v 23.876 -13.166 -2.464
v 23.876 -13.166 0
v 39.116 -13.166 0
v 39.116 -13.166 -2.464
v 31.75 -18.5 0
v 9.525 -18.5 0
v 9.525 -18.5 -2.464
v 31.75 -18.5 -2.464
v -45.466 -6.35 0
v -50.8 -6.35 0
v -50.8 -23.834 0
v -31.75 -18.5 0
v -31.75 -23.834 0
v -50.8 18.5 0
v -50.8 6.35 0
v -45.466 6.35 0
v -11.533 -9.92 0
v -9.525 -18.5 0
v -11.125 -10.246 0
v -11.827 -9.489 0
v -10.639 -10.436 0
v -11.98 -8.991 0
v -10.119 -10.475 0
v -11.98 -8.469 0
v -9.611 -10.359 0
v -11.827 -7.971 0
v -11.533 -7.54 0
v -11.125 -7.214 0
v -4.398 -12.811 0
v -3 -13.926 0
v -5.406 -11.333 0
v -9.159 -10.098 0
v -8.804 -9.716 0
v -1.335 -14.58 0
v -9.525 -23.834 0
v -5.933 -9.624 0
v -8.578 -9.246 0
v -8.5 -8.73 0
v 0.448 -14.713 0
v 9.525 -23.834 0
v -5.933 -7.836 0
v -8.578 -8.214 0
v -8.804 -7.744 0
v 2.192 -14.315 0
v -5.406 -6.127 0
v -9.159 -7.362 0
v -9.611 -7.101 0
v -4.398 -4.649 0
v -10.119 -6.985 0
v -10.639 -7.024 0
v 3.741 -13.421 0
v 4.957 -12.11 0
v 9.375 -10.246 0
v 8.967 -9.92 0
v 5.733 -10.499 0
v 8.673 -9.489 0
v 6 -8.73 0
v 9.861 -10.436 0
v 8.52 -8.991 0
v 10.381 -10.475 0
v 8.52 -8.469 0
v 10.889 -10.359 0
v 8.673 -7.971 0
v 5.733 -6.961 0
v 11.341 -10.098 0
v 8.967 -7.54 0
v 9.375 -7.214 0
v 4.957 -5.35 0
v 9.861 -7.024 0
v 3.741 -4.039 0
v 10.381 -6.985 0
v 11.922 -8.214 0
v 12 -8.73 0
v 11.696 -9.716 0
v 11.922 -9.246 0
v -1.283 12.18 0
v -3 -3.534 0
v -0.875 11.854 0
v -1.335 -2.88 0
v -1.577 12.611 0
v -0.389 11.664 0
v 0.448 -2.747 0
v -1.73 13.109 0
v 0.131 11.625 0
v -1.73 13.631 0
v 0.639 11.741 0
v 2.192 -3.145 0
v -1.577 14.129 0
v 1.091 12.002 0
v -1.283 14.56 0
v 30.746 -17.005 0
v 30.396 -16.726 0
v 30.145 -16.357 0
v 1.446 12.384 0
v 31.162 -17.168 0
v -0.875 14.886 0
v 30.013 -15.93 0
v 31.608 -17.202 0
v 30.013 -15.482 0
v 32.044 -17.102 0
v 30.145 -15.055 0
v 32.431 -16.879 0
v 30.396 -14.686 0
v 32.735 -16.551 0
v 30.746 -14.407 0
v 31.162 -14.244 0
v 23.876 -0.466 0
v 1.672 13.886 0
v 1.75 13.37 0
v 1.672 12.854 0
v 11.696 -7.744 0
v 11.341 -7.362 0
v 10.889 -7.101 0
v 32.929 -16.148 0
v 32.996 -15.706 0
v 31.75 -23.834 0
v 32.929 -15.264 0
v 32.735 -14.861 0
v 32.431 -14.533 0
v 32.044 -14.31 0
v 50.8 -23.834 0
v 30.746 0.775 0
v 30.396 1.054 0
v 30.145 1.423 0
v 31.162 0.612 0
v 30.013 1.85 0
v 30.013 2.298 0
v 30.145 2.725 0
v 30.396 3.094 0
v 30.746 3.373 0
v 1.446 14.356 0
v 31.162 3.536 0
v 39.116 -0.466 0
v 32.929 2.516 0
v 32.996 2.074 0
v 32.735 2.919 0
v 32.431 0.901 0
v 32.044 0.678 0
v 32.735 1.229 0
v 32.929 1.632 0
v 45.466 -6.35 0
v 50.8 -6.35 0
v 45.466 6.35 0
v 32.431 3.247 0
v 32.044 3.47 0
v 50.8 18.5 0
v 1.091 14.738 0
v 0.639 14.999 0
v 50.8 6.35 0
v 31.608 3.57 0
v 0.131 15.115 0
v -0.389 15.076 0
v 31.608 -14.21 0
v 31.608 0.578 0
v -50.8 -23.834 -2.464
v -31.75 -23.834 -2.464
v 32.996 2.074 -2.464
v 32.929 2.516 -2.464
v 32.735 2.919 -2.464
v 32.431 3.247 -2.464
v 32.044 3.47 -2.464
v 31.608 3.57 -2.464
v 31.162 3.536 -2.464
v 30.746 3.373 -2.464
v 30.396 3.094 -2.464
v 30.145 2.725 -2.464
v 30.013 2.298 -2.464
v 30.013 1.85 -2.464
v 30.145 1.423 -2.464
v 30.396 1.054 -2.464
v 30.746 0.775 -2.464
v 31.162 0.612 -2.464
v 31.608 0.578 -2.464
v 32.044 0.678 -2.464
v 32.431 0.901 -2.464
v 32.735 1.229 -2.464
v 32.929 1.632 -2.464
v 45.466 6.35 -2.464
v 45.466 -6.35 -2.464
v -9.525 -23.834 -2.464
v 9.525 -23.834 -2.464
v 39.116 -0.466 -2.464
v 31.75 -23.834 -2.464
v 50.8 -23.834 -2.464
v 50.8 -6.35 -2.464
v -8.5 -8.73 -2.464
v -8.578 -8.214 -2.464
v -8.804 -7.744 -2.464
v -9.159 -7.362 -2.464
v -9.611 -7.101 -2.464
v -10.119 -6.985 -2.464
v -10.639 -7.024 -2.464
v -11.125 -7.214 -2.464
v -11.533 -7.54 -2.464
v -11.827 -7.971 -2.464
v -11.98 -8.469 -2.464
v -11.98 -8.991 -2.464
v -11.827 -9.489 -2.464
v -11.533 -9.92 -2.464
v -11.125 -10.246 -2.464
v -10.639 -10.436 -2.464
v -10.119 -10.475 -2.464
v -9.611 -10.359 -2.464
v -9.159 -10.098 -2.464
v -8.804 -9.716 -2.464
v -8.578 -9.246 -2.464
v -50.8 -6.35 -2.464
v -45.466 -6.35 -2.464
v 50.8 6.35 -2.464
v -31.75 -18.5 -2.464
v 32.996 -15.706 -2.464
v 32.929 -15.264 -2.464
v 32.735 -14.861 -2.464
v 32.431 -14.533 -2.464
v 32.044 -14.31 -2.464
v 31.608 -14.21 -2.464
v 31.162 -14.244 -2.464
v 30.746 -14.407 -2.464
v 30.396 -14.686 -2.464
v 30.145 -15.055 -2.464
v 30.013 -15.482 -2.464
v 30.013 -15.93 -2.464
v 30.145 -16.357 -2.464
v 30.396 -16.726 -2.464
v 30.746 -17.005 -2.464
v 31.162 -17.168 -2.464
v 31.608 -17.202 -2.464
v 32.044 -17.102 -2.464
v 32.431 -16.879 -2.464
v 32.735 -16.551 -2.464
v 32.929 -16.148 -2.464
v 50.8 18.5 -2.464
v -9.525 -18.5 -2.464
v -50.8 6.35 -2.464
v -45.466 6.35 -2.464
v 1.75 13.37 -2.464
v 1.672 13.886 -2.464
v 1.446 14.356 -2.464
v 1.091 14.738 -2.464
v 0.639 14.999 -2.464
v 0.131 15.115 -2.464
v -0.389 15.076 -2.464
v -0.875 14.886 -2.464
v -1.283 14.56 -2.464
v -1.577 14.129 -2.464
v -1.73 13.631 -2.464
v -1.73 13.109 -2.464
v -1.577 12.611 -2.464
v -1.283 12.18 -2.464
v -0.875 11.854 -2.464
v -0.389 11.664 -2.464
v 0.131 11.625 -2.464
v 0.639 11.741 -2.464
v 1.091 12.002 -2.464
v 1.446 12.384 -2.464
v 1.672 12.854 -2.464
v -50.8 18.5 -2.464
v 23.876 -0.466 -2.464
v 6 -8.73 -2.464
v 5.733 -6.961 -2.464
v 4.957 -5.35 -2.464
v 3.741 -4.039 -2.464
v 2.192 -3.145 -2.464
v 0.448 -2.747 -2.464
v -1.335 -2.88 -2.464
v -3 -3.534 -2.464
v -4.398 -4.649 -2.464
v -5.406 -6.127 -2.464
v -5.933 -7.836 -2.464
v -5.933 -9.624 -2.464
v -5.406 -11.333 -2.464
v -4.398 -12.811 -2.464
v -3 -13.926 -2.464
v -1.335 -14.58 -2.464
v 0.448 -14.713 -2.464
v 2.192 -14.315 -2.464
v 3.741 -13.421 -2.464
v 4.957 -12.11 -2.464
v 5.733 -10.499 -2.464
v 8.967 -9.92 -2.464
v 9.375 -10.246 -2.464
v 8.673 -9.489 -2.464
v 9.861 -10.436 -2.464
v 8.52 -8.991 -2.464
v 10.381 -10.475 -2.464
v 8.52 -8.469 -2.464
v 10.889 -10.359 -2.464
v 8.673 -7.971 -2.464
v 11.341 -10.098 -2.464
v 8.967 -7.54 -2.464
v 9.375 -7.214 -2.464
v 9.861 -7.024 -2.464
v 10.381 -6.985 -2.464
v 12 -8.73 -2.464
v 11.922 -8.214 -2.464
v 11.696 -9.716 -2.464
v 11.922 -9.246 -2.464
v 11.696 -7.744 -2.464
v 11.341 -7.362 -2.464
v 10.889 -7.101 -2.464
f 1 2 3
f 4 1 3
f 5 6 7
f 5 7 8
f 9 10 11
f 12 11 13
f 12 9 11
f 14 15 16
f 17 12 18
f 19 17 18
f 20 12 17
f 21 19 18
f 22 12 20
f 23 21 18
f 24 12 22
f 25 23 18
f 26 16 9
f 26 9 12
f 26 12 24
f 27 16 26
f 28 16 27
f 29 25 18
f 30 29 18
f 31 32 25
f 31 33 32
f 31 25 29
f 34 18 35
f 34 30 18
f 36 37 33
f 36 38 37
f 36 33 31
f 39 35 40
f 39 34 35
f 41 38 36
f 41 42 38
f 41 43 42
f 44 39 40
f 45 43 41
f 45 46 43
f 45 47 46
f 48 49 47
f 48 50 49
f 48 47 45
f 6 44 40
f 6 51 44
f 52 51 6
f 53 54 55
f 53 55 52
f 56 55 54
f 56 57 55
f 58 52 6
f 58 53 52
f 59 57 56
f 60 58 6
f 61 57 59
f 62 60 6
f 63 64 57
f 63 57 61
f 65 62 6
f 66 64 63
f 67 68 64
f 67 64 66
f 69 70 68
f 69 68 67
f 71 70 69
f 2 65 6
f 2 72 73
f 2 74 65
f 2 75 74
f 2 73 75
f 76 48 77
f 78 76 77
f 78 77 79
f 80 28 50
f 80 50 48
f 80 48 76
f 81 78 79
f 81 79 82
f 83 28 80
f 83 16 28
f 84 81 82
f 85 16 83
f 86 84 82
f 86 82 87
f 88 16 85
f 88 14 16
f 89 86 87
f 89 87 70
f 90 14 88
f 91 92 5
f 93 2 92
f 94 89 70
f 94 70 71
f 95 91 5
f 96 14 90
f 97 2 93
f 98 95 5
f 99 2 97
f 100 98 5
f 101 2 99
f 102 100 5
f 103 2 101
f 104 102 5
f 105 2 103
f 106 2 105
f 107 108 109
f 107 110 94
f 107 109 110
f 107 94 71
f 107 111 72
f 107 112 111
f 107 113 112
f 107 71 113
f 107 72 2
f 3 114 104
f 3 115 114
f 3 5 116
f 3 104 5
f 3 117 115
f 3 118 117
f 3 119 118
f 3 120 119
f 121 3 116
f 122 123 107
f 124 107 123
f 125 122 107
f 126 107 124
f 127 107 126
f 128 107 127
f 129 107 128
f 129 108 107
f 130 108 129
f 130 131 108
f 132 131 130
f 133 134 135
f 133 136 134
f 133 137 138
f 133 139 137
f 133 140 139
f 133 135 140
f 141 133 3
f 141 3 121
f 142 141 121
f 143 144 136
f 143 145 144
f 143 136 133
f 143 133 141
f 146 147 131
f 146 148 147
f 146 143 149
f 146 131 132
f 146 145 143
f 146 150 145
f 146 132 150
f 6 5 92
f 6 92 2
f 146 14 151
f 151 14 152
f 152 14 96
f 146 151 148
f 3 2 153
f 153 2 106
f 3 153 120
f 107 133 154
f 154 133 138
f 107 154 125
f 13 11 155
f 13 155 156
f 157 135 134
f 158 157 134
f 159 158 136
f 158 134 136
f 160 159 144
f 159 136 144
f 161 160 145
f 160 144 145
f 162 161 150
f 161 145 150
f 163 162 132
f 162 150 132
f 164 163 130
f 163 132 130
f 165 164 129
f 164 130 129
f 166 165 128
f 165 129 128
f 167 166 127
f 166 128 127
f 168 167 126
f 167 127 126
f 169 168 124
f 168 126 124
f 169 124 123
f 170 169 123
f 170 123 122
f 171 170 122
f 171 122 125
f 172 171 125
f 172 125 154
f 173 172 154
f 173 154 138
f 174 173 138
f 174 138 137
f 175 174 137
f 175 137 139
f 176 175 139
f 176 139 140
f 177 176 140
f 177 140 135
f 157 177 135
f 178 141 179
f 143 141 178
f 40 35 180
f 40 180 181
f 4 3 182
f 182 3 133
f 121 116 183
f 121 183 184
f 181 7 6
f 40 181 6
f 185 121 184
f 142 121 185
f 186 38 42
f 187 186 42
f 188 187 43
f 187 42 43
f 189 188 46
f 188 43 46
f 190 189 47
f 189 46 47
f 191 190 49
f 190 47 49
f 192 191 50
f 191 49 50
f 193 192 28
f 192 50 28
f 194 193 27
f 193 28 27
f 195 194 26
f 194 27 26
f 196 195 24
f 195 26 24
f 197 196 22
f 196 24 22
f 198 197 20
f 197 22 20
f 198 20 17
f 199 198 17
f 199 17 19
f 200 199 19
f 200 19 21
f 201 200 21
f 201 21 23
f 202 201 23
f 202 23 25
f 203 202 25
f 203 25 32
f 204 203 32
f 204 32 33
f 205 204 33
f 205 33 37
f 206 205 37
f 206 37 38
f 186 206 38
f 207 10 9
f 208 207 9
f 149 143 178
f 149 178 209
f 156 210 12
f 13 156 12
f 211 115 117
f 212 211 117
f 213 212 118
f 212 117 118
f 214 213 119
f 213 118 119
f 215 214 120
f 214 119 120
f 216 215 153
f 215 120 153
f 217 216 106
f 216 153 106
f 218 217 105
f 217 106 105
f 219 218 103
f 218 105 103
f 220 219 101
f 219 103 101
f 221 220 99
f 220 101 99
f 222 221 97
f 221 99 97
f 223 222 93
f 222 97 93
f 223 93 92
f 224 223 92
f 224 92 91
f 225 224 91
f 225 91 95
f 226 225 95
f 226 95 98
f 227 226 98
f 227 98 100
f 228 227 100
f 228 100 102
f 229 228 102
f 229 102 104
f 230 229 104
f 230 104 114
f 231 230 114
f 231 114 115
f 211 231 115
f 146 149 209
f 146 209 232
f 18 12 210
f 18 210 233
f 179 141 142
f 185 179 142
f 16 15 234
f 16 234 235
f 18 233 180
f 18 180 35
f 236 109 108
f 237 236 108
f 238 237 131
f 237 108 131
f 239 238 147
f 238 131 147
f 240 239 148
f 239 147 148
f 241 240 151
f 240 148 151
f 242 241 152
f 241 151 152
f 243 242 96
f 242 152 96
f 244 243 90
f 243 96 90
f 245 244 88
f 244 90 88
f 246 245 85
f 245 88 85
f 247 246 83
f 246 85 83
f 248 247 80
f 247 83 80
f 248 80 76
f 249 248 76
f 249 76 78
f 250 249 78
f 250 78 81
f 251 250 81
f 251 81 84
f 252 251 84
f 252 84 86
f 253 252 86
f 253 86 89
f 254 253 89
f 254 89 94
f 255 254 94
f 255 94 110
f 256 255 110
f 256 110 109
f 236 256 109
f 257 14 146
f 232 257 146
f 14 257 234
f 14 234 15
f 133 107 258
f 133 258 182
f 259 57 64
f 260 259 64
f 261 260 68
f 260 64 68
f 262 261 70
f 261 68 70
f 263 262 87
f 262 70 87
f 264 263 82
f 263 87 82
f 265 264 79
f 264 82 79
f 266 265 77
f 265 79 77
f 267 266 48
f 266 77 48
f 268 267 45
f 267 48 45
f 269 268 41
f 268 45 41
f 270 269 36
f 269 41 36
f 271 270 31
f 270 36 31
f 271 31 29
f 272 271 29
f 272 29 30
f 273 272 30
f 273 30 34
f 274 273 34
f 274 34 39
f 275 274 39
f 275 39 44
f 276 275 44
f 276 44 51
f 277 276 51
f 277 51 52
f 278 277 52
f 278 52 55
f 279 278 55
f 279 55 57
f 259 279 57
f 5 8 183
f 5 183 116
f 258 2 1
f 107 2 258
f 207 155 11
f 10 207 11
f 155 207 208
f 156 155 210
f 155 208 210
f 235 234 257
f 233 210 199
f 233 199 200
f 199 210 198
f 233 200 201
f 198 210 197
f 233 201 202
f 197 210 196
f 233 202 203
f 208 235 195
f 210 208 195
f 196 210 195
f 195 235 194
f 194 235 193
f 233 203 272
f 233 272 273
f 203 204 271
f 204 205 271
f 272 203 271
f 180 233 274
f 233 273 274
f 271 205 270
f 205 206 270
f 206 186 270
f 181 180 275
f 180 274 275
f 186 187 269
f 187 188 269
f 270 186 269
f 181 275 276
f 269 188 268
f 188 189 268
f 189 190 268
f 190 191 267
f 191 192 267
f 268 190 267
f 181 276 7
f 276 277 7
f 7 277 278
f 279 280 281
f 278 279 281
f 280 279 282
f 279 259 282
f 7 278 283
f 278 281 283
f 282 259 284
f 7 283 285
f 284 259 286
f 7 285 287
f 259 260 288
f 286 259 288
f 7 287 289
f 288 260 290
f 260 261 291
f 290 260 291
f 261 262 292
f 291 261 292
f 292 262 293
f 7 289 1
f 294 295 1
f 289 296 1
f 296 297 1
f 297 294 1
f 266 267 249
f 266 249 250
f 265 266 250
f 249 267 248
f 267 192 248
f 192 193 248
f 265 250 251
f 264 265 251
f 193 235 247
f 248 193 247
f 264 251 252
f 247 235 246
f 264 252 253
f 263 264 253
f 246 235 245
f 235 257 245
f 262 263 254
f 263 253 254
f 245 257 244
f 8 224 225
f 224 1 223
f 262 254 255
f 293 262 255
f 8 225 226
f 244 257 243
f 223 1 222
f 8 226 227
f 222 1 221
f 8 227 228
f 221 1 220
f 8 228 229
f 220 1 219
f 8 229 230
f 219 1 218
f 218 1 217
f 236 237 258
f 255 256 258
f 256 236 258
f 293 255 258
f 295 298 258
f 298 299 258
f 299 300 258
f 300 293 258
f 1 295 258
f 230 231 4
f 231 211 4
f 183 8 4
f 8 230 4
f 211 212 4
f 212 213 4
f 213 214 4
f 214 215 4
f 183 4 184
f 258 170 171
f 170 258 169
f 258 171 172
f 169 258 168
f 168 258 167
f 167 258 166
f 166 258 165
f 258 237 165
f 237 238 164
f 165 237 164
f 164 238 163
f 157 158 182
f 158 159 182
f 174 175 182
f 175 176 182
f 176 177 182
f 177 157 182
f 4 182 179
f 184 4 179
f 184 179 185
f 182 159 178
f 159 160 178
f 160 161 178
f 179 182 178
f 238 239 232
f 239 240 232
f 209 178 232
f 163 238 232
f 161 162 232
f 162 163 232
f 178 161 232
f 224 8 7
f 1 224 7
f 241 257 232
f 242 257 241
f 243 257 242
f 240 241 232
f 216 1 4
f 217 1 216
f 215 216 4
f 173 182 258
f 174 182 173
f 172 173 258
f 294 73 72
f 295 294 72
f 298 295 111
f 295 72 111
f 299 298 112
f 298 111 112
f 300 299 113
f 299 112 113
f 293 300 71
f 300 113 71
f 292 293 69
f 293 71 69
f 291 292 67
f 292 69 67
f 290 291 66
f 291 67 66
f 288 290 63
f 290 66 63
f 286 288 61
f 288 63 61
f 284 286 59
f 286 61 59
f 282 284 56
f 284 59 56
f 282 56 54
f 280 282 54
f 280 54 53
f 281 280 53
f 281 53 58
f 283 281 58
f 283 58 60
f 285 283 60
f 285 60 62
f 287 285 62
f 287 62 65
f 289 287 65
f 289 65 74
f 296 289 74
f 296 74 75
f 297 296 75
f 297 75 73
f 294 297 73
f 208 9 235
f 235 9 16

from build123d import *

# Parameters (mm, degrees)
SKETCH1_W            = 101.6
SKETCH1_H            = 37
BASE_SHAPE_DEPTH     = 2.4638
SKETCH2_R            = 6
SKETCH2_R_2          = 1.75
MOTOR_HOLES_DEPTH    = 55.11986983
SKETCH4_W            = 19.05
SKETCH4_H            = 2.4638
BOTTOM_TEETH_DEPTH   = 5.334
SKETCH5_W            = 5.334
SKETCH5_H            = 12.7
SIDE_SLOTS_DEPTH     = 57.167338075
SKETCH7_W            = 15.24
SKETCH7_H            = 12.7
ENCODER_CUTOUT_DEPTH = 72.809068434
SKETCH8_R            = 1.5
ENCODER_MOUNTS_DEPTH = 57.167338075


with BuildPart() as part:
    # Sketch1 → Base Shape (new body)
    with BuildSketch(Plane.XY):
        Rectangle(SKETCH1_W, SKETCH1_H)
    extrude(amount=-BASE_SHAPE_DEPTH)

    # Sketch2 → Motor Holes (cut, through all)
    with BuildSketch(Plane.XY):
        with Locations((0, -8.73)):
            Circle(SKETCH2_R)
        with Locations((-10.25, -8.73)):
            Circle(SKETCH2_R_2)
        with Locations((10.25, -8.73)):
            Circle(SKETCH2_R_2)
        with Locations((0, 13.369999996)):
            Circle(SKETCH2_R_2)
    extrude(amount=-MOTOR_HOLES_DEPTH, mode=Mode.SUBTRACT)

    # Sketch4 → Bottom teeth (add)
    with BuildSketch(Plane.XZ.offset(18.5)):
        with Locations((-41.275, -1.2319)):
            Rectangle(SKETCH4_W, SKETCH4_H)
        with Locations((0, -1.2319)):
            Rectangle(SKETCH4_W, SKETCH4_H)
        with Locations((41.275, -1.2319)):
            Rectangle(SKETCH4_W, SKETCH4_H)
    extrude(amount=BOTTOM_TEETH_DEPTH)

    # Sketch5 → Side Slots (cut, through all)
    with BuildSketch(Plane.XY):
        with Locations((48.133, 0)):
            Rectangle(SKETCH5_W, SKETCH5_H)
        with Locations((-48.133, 0)):
            Rectangle(SKETCH5_W, SKETCH5_H)
    extrude(amount=-SIDE_SLOTS_DEPTH, mode=Mode.SUBTRACT)

    # Sketch7 → Encoder Cutout (cut, through all)
    with BuildSketch(Plane(origin=(16.243120564, -7.106483242, 0), x_dir=(1, 0, 0), z_dir=(0, 0, 1))):
        with Locations((15.252879436, 0.290483242)):
            Rectangle(SKETCH7_W, SKETCH7_H)
    extrude(amount=-ENCODER_CUTOUT_DEPTH, mode=Mode.SUBTRACT)

    # Sketch8 → Encoder Mounts (cut, through all)
    with BuildSketch(Plane.XY):
        with Locations((31.496, 2.074)):
            Circle(SKETCH8_R)
        with Locations((31.496, -15.706)):
            Circle(SKETCH8_R)
    extrude(amount=-ENCODER_MOUNTS_DEPTH, mode=Mode.SUBTRACT)


solid = part.part
